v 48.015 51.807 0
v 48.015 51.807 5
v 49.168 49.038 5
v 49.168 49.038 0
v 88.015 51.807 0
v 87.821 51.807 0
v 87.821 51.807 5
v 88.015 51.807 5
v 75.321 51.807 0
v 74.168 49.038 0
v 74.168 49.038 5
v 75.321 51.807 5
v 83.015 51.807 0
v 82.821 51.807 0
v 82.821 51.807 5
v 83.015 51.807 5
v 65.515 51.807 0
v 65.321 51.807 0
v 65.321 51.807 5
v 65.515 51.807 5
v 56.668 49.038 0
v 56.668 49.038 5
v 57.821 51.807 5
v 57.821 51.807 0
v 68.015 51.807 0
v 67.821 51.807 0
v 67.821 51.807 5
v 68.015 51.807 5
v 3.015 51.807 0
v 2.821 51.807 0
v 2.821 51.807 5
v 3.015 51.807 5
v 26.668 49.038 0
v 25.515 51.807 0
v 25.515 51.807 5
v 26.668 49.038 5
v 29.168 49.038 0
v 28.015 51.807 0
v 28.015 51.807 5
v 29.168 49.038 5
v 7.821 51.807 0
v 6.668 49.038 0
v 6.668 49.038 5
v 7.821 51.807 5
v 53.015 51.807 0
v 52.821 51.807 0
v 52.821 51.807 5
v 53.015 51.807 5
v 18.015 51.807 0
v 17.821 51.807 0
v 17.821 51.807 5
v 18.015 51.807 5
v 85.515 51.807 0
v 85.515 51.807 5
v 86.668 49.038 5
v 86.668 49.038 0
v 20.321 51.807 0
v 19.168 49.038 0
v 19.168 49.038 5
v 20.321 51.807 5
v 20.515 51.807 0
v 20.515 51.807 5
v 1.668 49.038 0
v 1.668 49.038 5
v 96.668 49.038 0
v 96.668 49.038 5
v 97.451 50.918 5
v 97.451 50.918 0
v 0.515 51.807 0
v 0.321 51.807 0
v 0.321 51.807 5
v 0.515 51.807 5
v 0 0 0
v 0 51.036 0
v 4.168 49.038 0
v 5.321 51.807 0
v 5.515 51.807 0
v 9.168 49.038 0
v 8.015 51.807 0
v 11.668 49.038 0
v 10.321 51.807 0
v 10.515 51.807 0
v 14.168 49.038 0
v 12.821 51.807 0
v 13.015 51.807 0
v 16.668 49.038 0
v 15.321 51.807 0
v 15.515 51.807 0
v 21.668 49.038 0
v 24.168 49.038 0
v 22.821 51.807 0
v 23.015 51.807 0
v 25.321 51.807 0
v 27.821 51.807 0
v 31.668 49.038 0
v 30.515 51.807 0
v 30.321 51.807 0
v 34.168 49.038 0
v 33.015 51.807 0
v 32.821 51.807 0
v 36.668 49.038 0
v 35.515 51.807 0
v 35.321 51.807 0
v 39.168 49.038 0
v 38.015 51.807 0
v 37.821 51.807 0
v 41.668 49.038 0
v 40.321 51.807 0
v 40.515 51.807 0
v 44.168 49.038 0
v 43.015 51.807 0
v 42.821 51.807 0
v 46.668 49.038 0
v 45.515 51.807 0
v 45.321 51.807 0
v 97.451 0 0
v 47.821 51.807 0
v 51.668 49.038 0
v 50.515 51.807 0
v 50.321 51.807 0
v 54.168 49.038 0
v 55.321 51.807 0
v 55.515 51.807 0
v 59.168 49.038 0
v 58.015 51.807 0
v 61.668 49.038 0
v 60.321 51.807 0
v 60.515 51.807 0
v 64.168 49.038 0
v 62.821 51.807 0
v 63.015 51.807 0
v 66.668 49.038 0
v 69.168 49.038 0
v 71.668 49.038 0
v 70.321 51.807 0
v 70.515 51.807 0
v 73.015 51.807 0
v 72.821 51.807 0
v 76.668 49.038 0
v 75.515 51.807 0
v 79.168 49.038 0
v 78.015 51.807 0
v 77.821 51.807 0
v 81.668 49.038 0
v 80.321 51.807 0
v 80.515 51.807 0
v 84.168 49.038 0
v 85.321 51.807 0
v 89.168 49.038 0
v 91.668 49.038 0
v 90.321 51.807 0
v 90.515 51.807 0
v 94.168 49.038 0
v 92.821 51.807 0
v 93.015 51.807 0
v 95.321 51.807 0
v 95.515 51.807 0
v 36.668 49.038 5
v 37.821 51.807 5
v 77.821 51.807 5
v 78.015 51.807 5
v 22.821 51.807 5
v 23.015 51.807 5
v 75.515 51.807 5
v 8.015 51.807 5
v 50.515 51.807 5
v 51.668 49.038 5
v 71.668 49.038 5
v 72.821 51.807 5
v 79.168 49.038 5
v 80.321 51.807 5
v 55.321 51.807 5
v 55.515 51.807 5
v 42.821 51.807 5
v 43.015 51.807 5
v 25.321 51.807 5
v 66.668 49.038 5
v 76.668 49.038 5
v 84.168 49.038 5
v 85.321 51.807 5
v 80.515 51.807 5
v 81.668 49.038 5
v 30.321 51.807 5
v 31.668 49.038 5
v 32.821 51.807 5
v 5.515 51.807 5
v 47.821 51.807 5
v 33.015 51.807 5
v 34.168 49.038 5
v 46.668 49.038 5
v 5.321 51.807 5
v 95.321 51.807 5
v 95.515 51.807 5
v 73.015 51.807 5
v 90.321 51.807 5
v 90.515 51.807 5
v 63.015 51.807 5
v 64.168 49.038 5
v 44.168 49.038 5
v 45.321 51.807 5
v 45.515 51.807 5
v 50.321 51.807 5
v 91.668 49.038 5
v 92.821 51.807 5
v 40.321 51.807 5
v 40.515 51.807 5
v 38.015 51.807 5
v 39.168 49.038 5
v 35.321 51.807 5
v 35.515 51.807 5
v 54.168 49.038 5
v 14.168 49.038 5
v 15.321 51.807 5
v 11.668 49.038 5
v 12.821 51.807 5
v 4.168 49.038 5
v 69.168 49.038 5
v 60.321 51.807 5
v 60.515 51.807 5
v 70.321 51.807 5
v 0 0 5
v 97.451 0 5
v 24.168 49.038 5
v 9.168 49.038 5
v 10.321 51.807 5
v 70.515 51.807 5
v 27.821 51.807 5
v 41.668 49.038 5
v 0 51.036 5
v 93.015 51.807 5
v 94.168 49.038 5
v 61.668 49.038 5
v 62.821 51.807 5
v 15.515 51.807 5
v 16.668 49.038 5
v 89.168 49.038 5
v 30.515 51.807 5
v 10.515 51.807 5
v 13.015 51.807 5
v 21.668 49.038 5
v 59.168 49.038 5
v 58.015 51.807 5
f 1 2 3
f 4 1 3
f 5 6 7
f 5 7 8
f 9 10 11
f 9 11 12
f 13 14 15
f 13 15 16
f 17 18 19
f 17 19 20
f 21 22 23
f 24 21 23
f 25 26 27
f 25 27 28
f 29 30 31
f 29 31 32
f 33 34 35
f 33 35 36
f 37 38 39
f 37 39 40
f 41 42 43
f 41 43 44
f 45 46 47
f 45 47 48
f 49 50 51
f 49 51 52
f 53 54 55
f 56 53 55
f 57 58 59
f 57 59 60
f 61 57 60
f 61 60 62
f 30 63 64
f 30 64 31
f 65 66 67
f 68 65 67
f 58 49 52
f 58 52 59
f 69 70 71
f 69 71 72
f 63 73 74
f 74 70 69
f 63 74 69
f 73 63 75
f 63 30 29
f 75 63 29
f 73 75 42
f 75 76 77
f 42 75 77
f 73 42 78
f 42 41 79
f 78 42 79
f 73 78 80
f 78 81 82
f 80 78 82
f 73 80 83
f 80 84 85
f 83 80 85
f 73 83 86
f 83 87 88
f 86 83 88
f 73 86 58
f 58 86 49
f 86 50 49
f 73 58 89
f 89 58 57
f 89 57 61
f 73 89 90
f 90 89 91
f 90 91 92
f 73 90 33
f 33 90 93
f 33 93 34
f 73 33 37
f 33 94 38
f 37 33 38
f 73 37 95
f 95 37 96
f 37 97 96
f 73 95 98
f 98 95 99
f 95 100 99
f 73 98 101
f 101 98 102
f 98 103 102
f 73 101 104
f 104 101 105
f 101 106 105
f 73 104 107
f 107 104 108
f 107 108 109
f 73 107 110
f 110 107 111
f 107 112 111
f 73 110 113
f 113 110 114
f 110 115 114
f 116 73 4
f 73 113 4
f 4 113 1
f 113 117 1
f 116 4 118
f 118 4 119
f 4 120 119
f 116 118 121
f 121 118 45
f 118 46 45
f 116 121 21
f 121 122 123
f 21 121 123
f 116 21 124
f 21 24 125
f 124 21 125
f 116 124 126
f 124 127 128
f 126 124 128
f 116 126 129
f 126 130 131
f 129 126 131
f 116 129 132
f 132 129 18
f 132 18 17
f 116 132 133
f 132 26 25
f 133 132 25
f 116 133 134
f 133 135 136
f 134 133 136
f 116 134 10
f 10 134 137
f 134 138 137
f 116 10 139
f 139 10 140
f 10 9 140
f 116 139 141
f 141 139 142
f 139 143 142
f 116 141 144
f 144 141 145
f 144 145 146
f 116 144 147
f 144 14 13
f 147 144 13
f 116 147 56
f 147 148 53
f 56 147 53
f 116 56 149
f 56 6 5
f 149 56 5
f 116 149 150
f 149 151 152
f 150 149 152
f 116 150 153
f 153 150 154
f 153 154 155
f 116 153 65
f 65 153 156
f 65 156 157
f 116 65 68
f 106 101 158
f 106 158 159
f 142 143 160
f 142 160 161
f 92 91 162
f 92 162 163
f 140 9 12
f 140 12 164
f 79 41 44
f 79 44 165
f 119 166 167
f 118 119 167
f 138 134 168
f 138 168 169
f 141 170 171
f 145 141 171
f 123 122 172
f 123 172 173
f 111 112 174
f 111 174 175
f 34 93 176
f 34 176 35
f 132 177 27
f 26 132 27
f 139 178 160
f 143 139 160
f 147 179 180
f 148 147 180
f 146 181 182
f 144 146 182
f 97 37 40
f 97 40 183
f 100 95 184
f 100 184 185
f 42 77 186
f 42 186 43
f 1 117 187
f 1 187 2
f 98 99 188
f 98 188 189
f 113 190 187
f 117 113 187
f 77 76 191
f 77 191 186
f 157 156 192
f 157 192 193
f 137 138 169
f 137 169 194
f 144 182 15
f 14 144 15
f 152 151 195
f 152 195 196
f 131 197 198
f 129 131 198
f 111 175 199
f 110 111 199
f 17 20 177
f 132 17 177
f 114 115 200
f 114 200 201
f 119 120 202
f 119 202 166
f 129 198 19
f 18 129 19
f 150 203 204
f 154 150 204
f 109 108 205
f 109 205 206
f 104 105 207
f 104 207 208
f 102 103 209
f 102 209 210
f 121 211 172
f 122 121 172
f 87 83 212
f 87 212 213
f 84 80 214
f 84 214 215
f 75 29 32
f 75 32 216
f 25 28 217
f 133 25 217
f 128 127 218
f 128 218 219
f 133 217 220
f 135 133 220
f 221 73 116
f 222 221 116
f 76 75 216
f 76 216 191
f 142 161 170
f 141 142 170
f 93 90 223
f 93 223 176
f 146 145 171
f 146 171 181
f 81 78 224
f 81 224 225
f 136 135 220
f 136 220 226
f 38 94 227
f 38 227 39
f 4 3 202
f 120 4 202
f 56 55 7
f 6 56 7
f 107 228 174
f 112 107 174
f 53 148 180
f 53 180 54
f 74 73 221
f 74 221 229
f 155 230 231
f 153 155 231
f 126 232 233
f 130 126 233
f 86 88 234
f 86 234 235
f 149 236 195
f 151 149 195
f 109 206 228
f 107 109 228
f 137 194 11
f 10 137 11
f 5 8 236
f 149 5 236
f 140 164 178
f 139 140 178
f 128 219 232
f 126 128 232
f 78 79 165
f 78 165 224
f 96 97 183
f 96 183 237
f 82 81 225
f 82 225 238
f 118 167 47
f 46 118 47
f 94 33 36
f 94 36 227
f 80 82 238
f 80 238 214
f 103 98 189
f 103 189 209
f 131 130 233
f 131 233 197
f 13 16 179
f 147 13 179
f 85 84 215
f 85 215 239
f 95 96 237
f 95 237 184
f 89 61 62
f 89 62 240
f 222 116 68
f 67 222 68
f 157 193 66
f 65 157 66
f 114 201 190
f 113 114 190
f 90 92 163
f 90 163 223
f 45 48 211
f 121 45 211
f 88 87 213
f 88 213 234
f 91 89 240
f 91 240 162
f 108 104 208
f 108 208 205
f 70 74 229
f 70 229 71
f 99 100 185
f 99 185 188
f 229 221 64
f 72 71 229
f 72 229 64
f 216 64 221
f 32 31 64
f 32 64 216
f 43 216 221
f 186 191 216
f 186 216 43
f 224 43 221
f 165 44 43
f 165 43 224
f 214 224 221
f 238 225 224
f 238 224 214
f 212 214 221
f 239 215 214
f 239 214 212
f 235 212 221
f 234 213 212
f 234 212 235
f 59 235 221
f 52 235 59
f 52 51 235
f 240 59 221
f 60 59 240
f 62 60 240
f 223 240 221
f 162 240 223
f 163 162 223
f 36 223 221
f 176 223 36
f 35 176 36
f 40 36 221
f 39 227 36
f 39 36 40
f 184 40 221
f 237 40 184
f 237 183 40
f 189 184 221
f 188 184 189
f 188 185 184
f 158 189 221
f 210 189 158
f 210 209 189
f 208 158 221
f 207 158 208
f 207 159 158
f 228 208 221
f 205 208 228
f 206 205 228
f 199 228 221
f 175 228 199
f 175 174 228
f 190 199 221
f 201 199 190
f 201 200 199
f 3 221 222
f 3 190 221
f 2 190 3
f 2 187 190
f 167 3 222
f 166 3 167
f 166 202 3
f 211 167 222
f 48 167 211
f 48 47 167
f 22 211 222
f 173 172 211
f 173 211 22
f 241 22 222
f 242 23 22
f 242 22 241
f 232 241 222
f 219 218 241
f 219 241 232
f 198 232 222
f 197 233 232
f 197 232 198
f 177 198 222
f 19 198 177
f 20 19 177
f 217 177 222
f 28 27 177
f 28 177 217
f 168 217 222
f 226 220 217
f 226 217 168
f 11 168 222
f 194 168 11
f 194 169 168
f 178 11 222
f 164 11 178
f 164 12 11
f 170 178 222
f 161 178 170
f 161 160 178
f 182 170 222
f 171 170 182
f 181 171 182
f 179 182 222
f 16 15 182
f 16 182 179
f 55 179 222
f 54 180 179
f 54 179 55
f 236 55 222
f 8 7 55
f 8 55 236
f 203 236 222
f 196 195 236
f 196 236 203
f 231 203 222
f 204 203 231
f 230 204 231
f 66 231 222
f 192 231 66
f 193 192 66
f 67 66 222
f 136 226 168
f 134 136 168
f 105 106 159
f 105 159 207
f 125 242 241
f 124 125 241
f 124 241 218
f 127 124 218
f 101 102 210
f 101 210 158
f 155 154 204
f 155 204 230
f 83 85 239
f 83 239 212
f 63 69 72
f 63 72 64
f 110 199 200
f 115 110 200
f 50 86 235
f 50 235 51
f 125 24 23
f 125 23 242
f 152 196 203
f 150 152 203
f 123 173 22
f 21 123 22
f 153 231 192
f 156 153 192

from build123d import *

# Parameters (mm, degrees)
SKETCH9_W           = 97.4508292
SKETCH9_H           = 51.807344848
BOSS_EXTRUDE3_DEPTH = 5
CUT_EXTRUDE9_DEPTH  = 111.479251862
LPATTERN1_COUNT     = 23
LPATTERN1_PITCH     = 2.5
LPATTERN2_DEPTH     = 5


# Read off the part's stored shape, not the designer's step: LPattern2
with BuildPart() as part:
    # Sketch9 → Boss-Extrude3 (new body)
    with BuildSketch(Plane.XY):
        with Locations((48.7254146, 25.903672424)):
            Rectangle(SKETCH9_W, SKETCH9_H)
    extrude(amount=BOSS_EXTRUDE3_DEPTH)

    # Sketch13 → Cut-Extrude9 (cut, symmetric)
    with BuildSketch(Plane.XY.offset(5)):
        Polygon((-22.504808693, 203.169515117), (40.514829285, 51.807344848), (41.667928087, 49.037802801), (42.821026889, 51.807344848), (105.840664868, 203.169515117), (105.840664868, 531.084024461), (-22.504808693, 531.084024461), align=None)
    cut_extrude9 = extrude(amount=CUT_EXTRUDE9_DEPTH, both=True, mode=Mode.SUBTRACT)

    # LPattern1: Cut-Extrude9 ×23
    with Locations(*[(i * LPATTERN1_PITCH, 0, 0) for i in range(1, LPATTERN1_COUNT)]):
        add(cut_extrude9, mode=Mode.SUBTRACT)

    # LPattern2 outline → LPattern2 (cut)
    with BuildSketch(Plane.XY):
        Polygon((0, 51.036294296), (0.321026889, 51.807344848), (0, 51.807344848), align=None)
        Polygon((1.667928087, 49.037802801), (2.821026889, 51.807344848), (0.514829285, 51.807344848), align=None)
        Polygon((4.167928087, 49.037802801), (5.321026889, 51.807344848), (3.014829285, 51.807344848), align=None)
        Polygon((6.667928087, 49.037802801), (7.821026889, 51.807344848), (5.514829285, 51.807344848), align=None)
        Polygon((9.167928087, 49.037802801), (10.321026889, 51.807344848), (8.014829285, 51.807344848), align=None)
        Polygon((11.667928087, 49.037802801), (12.821026889, 51.807344848), (10.514829285, 51.807344848), align=None)
        Polygon((14.167928087, 49.037802801), (15.321026889, 51.807344848), (13.014829285, 51.807344848), align=None)
        Polygon((16.667928087, 49.037802801), (17.821026889, 51.807344848), (15.514829285, 51.807344848), align=None)
        Polygon((19.167928087, 49.037802801), (20.321026889, 51.807344848), (18.014829285, 51.807344848), align=None)
        Polygon((21.667928087, 49.037802801), (22.821026889, 51.807344848), (20.514829285, 51.807344848), align=None)
        Polygon((24.167928087, 49.037802801), (25.321026889, 51.807344848), (23.014829285, 51.807344848), align=None)
        Polygon((26.667928087, 49.037802801), (27.821026889, 51.807344848), (25.514829285, 51.807344848), align=None)
        Polygon((29.167928087, 49.037802801), (30.321026889, 51.807344848), (28.014829285, 51.807344848), align=None)
        Polygon((31.667928087, 49.037802801), (32.821026889, 51.807344848), (30.514829285, 51.807344848), align=None)
        Polygon((34.167928087, 49.037802801), (35.321026889, 51.807344848), (33.014829285, 51.807344848), align=None)
        Polygon((36.667928087, 49.037802801), (37.821026889, 51.807344848), (35.514829285, 51.807344848), align=None)
        Polygon((38.014829285, 51.807344848), (39.167928087, 49.037802801), (40.321026889, 51.807344848), align=None)
    extrude(amount=LPATTERN2_DEPTH, mode=Mode.SUBTRACT)


solid = part.part
